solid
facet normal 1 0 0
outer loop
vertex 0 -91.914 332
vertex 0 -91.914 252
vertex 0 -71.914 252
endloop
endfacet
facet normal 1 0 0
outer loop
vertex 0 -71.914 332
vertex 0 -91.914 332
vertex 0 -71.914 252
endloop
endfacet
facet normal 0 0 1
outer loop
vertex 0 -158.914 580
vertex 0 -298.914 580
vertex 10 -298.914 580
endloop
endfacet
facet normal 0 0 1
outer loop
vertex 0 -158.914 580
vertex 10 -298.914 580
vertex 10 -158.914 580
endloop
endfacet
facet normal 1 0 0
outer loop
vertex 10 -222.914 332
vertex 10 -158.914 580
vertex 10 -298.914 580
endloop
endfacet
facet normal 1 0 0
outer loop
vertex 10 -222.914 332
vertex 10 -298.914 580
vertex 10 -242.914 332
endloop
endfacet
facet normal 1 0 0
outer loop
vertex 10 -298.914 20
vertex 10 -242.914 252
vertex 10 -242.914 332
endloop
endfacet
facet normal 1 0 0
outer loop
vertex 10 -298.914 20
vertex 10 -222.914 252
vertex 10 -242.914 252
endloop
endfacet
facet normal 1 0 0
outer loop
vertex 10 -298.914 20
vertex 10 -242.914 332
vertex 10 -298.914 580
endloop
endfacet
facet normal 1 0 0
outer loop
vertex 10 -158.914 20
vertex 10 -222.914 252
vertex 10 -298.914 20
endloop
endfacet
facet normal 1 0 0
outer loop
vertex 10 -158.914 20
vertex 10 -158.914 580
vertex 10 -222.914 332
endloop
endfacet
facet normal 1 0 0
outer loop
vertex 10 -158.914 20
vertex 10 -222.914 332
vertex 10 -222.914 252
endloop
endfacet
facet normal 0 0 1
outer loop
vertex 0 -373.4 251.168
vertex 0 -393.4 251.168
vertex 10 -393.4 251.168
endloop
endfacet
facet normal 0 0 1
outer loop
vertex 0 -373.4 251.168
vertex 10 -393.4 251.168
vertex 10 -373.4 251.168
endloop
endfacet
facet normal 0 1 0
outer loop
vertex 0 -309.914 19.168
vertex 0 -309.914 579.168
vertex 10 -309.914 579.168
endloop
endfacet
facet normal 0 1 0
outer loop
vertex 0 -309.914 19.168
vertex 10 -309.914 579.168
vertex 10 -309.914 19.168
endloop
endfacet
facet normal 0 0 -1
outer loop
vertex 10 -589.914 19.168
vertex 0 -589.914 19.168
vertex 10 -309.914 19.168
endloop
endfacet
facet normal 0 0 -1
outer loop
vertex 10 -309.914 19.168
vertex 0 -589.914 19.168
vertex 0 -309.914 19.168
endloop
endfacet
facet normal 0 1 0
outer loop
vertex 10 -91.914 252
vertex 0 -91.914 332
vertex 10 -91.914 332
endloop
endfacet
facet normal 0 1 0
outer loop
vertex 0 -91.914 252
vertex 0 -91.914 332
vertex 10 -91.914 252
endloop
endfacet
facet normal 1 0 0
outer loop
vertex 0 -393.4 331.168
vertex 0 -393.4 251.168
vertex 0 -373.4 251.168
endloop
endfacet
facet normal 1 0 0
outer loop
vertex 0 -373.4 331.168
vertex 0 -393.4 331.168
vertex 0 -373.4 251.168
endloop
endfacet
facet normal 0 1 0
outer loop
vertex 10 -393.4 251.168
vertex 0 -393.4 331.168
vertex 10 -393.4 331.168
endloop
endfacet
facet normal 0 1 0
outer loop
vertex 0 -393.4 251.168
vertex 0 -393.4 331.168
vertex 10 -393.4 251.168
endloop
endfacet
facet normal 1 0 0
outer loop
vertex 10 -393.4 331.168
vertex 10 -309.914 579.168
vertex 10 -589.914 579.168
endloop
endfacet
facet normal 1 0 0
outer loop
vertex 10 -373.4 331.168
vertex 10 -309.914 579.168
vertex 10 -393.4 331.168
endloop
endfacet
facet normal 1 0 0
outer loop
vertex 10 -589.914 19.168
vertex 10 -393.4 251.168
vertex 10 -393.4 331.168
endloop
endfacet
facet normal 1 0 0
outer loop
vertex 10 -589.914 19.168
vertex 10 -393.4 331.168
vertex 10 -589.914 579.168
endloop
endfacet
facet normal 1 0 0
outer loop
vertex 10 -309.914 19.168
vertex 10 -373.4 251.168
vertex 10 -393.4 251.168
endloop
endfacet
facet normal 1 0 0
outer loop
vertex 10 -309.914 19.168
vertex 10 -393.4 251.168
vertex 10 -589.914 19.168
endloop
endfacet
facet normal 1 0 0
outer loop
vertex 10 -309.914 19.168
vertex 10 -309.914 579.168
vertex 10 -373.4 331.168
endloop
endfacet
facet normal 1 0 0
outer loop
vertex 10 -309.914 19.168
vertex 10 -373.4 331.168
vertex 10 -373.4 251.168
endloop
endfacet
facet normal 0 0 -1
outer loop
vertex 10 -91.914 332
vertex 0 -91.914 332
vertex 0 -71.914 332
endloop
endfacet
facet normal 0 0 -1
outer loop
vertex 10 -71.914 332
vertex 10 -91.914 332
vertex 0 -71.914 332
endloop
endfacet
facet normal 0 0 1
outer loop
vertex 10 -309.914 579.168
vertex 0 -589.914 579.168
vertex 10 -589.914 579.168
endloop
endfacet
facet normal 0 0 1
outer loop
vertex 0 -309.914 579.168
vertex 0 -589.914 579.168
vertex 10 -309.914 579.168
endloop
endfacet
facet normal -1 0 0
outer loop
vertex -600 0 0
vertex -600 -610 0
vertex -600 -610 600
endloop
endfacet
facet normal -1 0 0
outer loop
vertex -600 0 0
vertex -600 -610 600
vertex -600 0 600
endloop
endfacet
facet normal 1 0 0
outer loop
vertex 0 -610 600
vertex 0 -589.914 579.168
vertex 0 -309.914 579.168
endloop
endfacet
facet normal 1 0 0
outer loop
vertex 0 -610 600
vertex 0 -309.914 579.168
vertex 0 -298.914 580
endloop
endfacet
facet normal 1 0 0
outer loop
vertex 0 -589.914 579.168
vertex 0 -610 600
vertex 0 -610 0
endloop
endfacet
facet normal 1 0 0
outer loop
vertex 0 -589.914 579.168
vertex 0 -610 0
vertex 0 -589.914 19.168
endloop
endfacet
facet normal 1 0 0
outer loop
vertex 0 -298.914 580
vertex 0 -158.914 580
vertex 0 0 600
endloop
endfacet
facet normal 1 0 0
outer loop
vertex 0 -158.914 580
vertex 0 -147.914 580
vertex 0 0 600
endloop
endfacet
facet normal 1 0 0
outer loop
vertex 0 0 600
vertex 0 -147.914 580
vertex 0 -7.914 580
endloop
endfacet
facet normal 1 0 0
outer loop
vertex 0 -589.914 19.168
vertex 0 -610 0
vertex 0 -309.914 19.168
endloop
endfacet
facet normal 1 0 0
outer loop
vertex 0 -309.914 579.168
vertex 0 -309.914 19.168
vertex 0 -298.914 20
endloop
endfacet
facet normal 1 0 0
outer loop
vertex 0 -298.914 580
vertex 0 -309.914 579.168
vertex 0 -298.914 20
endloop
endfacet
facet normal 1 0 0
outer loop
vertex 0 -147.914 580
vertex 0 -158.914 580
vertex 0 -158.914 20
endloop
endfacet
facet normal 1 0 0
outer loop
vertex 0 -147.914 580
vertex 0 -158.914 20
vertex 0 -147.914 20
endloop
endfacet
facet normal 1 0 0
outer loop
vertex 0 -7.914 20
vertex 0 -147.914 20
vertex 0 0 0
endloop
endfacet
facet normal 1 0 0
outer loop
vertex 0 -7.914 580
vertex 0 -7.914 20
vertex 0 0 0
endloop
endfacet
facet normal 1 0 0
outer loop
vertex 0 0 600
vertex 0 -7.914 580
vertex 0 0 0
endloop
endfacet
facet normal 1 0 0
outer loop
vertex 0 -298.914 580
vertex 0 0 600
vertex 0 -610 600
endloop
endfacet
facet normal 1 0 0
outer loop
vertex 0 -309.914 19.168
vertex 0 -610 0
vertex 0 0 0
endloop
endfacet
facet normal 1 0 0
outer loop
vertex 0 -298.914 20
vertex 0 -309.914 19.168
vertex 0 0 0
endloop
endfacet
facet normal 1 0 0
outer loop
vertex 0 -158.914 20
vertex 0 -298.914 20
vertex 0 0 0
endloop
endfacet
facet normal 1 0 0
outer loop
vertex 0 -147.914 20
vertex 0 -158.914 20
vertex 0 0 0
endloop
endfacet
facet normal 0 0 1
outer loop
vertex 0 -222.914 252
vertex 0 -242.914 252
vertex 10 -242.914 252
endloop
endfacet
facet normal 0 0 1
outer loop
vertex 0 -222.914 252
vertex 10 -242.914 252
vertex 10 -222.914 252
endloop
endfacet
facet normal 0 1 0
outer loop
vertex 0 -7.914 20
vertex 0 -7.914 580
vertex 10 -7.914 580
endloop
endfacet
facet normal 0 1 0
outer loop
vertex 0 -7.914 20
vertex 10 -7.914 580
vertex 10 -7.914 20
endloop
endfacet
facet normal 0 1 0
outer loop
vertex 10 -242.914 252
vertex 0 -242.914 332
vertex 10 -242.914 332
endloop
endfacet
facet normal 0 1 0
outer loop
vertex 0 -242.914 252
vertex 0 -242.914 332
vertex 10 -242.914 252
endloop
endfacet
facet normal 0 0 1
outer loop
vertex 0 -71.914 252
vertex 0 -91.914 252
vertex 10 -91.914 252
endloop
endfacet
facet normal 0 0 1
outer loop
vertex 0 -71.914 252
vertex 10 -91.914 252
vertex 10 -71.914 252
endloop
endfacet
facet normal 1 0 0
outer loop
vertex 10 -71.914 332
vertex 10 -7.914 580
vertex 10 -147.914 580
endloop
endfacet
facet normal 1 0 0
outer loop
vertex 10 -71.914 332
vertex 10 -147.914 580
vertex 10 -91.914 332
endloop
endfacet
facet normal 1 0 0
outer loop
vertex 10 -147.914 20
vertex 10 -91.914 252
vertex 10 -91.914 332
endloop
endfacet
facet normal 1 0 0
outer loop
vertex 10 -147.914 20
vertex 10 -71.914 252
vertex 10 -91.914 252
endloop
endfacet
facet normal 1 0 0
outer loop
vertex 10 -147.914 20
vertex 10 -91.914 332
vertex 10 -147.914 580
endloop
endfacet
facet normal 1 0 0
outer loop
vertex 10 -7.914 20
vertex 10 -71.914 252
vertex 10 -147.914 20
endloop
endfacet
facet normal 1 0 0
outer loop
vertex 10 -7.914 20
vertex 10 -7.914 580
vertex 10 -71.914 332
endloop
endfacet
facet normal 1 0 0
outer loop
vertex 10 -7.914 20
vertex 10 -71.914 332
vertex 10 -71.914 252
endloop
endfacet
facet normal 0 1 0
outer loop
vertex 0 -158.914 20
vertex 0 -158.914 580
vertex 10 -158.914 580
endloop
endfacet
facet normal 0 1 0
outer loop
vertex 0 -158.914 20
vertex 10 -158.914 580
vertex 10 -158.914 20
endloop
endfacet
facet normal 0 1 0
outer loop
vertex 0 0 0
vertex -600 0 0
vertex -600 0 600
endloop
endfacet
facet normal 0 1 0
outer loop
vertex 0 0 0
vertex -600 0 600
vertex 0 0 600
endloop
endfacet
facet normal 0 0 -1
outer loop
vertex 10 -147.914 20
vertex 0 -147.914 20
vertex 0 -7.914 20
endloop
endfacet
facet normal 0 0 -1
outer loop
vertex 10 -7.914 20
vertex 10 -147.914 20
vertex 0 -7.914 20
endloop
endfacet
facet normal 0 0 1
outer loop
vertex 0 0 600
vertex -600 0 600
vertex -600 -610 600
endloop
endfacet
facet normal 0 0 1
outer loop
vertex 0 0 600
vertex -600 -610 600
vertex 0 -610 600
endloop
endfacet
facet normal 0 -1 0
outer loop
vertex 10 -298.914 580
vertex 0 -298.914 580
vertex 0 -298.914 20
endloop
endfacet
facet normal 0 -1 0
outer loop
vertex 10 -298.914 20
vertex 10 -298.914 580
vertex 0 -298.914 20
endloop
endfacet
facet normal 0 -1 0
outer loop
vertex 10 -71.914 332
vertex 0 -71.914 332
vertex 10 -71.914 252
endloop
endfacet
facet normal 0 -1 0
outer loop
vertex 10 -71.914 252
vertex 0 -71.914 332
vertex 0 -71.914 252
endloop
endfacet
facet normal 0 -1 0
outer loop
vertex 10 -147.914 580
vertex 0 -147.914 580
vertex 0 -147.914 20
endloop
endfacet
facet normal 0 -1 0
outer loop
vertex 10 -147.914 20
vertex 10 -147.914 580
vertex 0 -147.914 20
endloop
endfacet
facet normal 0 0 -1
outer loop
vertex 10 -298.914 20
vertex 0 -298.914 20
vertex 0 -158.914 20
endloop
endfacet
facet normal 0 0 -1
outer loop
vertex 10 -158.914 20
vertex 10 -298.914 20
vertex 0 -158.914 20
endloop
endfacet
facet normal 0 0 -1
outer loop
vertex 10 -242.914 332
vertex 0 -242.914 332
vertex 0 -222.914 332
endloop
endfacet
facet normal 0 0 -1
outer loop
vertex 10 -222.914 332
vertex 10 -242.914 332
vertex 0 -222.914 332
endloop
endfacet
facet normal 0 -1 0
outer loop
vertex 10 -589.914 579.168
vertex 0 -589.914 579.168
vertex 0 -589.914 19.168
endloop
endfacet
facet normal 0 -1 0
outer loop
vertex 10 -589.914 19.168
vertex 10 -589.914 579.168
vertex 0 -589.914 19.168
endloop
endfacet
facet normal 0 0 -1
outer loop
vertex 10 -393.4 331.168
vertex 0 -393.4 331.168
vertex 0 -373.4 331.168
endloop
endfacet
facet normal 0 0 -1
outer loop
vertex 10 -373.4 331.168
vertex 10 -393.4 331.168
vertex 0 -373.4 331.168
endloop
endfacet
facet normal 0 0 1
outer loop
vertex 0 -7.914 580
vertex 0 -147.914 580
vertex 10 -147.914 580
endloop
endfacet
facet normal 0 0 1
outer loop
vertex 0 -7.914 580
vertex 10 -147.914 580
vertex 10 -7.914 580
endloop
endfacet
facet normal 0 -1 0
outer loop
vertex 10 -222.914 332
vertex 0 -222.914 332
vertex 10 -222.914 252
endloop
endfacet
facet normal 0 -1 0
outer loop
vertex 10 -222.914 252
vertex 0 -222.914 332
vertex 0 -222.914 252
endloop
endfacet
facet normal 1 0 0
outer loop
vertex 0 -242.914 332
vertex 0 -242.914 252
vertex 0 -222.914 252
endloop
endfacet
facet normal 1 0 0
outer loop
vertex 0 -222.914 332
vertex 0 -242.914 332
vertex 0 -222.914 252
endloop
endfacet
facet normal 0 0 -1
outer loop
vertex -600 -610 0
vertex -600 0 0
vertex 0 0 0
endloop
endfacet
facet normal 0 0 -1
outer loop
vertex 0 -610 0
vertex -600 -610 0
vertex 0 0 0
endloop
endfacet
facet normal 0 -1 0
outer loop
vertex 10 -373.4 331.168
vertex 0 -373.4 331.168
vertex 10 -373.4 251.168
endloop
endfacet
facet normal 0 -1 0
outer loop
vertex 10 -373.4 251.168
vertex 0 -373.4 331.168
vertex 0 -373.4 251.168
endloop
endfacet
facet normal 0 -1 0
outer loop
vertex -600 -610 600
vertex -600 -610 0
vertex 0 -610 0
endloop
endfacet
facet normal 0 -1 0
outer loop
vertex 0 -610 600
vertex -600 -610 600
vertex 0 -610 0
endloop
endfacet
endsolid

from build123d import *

# Parameters (mm, degrees)
SKETCH1_W           = 600
SKETCH1_H           = 610
BOSS_EXTRUDE1_DEPTH = 600
SKETCH2_W           = 560
SKETCH2_H           = 140
SKETCH2_W_2         = 80
SKETCH2_H_2         = 20
SKETCH2_H_3         = 280
BOSS_EXTRUDE2_DEPTH = 10


with BuildPart() as part:
    # Sketch1 → Boss-Extrude1 (new body)
    with BuildSketch(Plane.XY):
        with Locations((-300, -305)):
            Rectangle(SKETCH1_W, SKETCH1_H)
    extrude(amount=BOSS_EXTRUDE1_DEPTH)

    # Sketch2 → Boss-Extrude2 (add)
    with BuildSketch(Plane(origin=(0, 0, 0), x_dir=(0, 0, -1), z_dir=(1, 0, 0))):
        with Locations((-300, -77.913832036)):
            Rectangle(SKETCH2_W, SKETCH2_H)
        with Locations((-292, -81.913832036)):
            Rectangle(SKETCH2_W_2, SKETCH2_H_2, mode=Mode.SUBTRACT)
        with Locations((-300, -228.913832036)):
            Rectangle(SKETCH2_W, SKETCH2_H)
        with Locations((-292, -232.913832036)):
            Rectangle(SKETCH2_W_2, SKETCH2_H_2, mode=Mode.SUBTRACT)
        with Locations((-299.167600113, -449.913832036)):
            Rectangle(SKETCH2_W, SKETCH2_H_3)
        with Locations((-291.167600113, -383.400082601)):
            Rectangle(SKETCH2_W_2, SKETCH2_H_2, mode=Mode.SUBTRACT)
    extrude(amount=BOSS_EXTRUDE2_DEPTH)


solid = part.part
